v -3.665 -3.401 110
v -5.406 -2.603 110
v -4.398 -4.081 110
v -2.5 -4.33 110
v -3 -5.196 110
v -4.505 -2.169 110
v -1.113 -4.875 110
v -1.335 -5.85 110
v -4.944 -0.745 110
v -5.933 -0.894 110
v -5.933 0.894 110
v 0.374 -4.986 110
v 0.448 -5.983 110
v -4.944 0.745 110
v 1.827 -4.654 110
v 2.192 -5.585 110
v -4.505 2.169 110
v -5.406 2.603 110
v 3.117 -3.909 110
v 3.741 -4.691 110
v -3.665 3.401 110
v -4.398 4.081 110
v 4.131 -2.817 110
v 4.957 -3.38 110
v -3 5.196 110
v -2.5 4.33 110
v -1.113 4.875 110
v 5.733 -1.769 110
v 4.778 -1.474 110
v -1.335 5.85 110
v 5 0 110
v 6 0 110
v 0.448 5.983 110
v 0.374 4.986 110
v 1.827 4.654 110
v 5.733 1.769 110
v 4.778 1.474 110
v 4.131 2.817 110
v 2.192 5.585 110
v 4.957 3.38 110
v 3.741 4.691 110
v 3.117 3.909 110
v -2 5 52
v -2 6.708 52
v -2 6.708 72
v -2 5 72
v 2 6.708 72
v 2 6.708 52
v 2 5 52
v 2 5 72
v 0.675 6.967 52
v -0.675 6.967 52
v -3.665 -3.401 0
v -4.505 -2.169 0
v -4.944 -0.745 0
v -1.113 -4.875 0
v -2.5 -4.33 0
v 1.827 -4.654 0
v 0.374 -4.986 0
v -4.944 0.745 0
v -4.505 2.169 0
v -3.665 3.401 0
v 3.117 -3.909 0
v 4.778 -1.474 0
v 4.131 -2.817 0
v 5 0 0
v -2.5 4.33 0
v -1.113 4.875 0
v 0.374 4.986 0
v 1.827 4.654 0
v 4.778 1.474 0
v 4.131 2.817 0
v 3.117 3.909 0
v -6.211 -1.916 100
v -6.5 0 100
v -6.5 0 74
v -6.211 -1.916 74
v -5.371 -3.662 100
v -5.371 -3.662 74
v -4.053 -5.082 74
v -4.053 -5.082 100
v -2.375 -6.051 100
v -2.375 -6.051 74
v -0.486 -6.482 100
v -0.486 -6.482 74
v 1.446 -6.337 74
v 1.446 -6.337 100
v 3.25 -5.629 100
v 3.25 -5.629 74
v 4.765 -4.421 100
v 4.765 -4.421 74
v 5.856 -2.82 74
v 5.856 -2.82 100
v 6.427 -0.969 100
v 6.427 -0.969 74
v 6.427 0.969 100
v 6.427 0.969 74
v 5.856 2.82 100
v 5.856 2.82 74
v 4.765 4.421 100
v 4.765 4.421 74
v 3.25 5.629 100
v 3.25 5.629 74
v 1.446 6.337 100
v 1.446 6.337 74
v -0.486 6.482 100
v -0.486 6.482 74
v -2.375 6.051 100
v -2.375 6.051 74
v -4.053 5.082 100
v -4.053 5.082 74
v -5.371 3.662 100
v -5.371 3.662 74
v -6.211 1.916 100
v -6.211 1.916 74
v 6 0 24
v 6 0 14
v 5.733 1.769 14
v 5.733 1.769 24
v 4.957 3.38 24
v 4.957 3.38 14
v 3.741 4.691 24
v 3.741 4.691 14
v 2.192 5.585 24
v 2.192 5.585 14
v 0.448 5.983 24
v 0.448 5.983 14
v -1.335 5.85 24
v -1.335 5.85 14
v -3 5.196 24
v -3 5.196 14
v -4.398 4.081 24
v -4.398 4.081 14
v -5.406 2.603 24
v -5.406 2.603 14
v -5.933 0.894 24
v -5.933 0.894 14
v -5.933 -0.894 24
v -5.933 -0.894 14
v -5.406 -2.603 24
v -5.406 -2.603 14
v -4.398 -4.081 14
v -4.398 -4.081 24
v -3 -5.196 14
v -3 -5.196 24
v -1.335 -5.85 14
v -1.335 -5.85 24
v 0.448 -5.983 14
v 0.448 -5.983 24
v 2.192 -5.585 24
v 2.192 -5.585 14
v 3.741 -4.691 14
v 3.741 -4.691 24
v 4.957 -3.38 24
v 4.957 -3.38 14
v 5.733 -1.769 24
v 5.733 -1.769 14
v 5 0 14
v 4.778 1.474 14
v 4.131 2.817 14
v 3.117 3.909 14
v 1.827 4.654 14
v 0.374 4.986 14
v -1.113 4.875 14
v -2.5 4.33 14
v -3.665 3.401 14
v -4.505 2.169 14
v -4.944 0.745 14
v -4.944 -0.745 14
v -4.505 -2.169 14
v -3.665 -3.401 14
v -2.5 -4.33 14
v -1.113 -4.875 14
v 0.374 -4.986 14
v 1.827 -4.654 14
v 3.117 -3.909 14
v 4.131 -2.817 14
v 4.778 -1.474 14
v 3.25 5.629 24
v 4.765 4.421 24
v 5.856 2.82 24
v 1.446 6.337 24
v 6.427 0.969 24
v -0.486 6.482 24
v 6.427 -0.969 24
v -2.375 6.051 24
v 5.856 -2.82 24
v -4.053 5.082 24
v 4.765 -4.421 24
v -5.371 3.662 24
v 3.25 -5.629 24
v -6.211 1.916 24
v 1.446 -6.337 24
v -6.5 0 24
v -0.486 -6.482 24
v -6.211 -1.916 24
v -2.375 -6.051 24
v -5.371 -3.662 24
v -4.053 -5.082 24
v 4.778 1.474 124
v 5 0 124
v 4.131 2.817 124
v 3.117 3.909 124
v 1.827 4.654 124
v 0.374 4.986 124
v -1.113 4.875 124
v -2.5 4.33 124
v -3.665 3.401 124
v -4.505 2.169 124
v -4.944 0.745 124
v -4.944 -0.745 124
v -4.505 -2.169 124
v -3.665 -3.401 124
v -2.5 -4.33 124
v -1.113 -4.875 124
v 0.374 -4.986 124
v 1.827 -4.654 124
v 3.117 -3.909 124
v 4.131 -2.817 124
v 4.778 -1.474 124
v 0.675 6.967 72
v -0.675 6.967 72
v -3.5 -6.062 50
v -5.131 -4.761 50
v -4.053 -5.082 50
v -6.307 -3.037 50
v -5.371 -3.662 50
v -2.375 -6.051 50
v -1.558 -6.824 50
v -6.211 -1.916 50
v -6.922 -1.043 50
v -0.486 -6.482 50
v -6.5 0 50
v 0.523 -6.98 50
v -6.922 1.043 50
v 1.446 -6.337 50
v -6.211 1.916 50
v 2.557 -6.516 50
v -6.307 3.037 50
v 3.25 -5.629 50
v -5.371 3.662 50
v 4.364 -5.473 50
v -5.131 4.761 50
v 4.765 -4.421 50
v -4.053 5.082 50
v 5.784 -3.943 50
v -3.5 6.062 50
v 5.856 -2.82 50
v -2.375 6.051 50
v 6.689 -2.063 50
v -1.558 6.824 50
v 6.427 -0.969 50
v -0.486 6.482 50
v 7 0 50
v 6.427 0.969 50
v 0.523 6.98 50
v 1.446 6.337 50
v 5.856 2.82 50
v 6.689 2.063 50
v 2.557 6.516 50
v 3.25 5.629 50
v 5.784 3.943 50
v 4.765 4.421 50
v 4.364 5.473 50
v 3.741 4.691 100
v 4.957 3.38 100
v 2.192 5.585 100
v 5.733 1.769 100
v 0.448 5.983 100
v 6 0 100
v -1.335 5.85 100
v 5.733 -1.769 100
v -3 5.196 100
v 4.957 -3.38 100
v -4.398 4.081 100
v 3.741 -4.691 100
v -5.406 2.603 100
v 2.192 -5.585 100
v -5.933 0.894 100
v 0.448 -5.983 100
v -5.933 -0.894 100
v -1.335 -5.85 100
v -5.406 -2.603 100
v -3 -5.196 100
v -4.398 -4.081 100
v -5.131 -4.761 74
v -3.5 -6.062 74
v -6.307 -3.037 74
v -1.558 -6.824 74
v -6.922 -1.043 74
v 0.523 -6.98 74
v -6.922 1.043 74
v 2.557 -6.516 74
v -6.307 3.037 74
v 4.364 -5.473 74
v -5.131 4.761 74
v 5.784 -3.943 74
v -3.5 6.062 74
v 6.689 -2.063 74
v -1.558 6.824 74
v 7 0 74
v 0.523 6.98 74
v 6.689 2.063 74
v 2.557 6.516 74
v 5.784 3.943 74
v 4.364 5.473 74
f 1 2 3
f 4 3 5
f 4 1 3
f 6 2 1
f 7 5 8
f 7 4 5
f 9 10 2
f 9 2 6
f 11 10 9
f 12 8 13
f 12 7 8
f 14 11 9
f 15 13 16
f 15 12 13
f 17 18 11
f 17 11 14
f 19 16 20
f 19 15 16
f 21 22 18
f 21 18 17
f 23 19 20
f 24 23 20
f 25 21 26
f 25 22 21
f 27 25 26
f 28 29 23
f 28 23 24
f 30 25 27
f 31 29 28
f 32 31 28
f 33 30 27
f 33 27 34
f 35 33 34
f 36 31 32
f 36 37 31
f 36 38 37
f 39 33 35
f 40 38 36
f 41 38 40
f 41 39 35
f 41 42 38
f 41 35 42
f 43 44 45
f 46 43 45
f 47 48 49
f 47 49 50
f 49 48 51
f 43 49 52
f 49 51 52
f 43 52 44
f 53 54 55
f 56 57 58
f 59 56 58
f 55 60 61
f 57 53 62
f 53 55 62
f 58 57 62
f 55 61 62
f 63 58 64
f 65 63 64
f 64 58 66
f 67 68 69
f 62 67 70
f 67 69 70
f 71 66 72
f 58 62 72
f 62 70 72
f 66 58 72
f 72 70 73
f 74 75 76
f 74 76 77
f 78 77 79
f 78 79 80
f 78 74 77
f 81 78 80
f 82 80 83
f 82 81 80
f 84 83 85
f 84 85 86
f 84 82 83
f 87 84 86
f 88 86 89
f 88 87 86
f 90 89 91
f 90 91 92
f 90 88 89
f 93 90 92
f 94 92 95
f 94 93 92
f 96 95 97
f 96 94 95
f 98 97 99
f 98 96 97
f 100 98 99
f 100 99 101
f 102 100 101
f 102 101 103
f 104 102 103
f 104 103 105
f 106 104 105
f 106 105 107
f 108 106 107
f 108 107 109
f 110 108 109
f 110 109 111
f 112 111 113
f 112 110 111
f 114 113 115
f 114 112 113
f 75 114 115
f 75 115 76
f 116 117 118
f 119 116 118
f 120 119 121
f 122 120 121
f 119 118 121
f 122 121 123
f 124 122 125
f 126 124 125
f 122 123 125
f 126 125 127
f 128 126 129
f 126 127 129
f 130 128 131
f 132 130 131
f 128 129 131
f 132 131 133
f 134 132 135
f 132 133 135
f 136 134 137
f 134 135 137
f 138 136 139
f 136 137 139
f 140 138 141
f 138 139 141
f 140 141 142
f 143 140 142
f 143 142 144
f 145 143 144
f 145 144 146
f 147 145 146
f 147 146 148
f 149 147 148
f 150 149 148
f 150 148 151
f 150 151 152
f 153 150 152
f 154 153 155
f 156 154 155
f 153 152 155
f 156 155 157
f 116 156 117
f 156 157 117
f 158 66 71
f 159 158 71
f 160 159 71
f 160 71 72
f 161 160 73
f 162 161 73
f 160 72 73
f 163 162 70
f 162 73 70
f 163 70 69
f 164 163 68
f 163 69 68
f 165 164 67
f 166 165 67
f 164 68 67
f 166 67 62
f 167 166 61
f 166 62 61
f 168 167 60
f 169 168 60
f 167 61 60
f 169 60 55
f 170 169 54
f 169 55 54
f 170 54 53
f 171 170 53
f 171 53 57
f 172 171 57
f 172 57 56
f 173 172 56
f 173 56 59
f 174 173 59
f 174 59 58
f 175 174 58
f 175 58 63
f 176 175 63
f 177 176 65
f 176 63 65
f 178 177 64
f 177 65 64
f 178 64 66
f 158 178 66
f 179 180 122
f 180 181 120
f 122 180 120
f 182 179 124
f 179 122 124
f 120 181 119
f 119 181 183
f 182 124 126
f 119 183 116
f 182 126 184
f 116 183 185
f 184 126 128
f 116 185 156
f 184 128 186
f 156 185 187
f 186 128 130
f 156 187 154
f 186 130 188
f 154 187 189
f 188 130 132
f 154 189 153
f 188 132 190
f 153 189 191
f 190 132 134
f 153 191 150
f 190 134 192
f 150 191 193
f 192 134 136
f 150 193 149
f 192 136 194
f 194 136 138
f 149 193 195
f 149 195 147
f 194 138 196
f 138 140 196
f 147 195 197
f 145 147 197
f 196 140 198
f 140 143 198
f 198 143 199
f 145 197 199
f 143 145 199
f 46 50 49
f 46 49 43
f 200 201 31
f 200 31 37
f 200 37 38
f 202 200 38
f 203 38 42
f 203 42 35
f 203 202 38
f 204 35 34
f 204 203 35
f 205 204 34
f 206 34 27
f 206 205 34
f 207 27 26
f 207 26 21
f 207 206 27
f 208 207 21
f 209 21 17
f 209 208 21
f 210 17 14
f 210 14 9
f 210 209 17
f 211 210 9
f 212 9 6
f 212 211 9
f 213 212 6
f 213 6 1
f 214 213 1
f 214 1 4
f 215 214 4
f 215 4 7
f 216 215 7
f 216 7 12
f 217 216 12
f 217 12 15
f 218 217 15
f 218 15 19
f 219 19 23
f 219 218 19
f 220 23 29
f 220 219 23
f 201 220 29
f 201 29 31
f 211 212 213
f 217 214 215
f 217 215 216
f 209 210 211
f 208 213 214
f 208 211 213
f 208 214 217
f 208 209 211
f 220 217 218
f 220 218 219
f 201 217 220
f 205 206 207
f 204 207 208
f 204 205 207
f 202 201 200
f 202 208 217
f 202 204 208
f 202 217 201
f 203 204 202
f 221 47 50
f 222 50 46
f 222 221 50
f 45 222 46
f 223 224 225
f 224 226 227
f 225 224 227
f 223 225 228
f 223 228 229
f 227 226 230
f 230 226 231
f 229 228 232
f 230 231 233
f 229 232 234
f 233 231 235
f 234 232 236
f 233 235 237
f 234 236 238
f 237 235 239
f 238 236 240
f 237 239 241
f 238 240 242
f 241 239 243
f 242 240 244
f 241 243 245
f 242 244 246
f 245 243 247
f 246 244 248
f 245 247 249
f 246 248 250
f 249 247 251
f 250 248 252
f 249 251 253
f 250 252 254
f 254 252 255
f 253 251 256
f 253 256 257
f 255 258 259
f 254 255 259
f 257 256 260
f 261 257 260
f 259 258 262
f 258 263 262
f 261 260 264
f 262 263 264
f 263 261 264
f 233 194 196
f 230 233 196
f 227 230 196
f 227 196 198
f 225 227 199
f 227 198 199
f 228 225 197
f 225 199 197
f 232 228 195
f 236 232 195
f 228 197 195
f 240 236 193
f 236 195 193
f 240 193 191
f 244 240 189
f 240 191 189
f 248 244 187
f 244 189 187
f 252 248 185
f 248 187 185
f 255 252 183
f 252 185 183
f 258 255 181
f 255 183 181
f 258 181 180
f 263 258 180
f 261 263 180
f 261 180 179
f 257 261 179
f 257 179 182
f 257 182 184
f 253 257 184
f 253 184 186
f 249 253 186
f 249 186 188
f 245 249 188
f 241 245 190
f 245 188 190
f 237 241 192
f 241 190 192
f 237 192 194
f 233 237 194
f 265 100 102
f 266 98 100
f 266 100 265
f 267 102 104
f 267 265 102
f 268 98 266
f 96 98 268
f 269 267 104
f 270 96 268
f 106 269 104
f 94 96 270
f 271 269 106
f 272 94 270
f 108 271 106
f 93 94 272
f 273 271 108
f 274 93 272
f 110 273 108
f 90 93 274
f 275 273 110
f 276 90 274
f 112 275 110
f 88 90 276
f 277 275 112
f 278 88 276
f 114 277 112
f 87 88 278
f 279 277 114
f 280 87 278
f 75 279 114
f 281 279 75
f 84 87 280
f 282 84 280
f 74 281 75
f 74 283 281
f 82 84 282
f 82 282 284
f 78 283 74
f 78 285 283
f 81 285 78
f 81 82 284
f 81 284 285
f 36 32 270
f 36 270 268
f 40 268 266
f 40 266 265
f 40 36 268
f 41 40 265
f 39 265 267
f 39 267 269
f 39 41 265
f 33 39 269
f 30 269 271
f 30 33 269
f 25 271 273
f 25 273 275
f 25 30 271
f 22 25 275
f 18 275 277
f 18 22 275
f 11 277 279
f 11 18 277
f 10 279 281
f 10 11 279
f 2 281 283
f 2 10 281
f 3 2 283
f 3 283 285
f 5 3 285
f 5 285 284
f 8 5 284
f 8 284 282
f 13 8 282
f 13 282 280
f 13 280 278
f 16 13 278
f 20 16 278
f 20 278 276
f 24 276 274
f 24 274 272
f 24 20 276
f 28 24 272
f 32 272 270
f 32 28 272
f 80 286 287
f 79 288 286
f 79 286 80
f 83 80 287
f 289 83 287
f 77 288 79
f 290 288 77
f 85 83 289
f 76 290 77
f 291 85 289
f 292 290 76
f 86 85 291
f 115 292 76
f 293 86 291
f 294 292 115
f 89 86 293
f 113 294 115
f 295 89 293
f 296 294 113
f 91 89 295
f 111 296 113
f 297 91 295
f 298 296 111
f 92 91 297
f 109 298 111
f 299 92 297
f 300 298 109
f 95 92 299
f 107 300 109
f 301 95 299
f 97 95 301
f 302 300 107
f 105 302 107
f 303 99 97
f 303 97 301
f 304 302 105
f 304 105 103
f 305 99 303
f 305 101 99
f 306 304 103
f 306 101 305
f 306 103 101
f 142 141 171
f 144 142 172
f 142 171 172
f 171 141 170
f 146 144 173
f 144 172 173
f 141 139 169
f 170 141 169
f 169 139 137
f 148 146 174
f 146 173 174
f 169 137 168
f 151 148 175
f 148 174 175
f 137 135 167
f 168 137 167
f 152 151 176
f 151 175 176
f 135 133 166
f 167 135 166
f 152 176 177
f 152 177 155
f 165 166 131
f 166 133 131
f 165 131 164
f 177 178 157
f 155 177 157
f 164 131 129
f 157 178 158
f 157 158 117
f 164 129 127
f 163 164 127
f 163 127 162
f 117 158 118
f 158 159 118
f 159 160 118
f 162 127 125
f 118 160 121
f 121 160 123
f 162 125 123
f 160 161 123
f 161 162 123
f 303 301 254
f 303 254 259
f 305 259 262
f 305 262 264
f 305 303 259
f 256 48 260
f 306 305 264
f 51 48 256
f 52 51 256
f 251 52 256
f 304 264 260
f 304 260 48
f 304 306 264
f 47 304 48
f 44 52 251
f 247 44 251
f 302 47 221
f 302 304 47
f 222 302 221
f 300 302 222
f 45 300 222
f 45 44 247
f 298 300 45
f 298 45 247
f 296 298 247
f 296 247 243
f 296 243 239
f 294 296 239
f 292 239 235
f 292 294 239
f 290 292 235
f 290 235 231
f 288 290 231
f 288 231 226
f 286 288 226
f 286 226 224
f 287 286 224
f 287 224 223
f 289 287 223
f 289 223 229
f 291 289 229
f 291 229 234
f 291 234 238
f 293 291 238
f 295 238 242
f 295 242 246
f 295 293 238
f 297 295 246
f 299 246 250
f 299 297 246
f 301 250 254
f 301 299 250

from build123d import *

# Parameters (mm, degrees)
SKETCH1_R           = 5
BOSS_EXTRUDE1_DEPTH = 14
SKETCH2_R           = 6
BOSS_EXTRUDE2_DEPTH = 10
SKETCH3_R           = 6.5
BOSS_EXTRUDE3_DEPTH = 26
SKETCH4_R           = 7
BOSS_EXTRUDE4_DEPTH = 12
SKETCH5_W           = 4
SKETCH5_H           = 20
CUT_EXTRUDE2_DEPTH  = 2


with BuildPart() as part:
    # Sketch1 → Boss-Extrude1 (new body)
    with BuildSketch(Plane(origin=(0, 0, 0), x_dir=(0, 1, 0), z_dir=(0, 0, 1))):
        with Locations(Location((0, 0, 0), (0, 0, 270))):
            Circle(SKETCH1_R)
    extrude(amount=BOSS_EXTRUDE1_DEPTH)

    # Sketch2 → Boss-Extrude2 (add)
    with BuildSketch(Plane.XY.offset(14)):
        Circle(SKETCH2_R)
    extrude(amount=BOSS_EXTRUDE2_DEPTH)

    # Sketch3 → Boss-Extrude3 (add)
    with BuildSketch(Plane.XY.offset(24)):
        with Locations(Location((0, 0, 0), (0, 0, 180))):
            Circle(SKETCH3_R)
    extrude(amount=BOSS_EXTRUDE3_DEPTH)

    # Sketch4 → Boss-Extrude4 (add)
    with BuildSketch(Plane.XY.offset(50)):
        Circle(SKETCH4_R)
    extrude(amount=BOSS_EXTRUDE4_DEPTH)

    # Mirror1: part across plane


with BuildPart() as part_1:
    add(part.part)
    add(part.part.mirror(Plane.XY.offset(62)))

    # Sketch5 → Cut-Extrude2 (cut)
    with BuildSketch(Plane(origin=(0, 7, 0), x_dir=(-1, 0, 0), z_dir=(0, 1, 0))):
        with Locations((0, 62)):
            Rectangle(SKETCH5_W, SKETCH5_H)
    extrude(amount=-CUT_EXTRUDE2_DEPTH, mode=Mode.SUBTRACT)


solid = part_1.part
